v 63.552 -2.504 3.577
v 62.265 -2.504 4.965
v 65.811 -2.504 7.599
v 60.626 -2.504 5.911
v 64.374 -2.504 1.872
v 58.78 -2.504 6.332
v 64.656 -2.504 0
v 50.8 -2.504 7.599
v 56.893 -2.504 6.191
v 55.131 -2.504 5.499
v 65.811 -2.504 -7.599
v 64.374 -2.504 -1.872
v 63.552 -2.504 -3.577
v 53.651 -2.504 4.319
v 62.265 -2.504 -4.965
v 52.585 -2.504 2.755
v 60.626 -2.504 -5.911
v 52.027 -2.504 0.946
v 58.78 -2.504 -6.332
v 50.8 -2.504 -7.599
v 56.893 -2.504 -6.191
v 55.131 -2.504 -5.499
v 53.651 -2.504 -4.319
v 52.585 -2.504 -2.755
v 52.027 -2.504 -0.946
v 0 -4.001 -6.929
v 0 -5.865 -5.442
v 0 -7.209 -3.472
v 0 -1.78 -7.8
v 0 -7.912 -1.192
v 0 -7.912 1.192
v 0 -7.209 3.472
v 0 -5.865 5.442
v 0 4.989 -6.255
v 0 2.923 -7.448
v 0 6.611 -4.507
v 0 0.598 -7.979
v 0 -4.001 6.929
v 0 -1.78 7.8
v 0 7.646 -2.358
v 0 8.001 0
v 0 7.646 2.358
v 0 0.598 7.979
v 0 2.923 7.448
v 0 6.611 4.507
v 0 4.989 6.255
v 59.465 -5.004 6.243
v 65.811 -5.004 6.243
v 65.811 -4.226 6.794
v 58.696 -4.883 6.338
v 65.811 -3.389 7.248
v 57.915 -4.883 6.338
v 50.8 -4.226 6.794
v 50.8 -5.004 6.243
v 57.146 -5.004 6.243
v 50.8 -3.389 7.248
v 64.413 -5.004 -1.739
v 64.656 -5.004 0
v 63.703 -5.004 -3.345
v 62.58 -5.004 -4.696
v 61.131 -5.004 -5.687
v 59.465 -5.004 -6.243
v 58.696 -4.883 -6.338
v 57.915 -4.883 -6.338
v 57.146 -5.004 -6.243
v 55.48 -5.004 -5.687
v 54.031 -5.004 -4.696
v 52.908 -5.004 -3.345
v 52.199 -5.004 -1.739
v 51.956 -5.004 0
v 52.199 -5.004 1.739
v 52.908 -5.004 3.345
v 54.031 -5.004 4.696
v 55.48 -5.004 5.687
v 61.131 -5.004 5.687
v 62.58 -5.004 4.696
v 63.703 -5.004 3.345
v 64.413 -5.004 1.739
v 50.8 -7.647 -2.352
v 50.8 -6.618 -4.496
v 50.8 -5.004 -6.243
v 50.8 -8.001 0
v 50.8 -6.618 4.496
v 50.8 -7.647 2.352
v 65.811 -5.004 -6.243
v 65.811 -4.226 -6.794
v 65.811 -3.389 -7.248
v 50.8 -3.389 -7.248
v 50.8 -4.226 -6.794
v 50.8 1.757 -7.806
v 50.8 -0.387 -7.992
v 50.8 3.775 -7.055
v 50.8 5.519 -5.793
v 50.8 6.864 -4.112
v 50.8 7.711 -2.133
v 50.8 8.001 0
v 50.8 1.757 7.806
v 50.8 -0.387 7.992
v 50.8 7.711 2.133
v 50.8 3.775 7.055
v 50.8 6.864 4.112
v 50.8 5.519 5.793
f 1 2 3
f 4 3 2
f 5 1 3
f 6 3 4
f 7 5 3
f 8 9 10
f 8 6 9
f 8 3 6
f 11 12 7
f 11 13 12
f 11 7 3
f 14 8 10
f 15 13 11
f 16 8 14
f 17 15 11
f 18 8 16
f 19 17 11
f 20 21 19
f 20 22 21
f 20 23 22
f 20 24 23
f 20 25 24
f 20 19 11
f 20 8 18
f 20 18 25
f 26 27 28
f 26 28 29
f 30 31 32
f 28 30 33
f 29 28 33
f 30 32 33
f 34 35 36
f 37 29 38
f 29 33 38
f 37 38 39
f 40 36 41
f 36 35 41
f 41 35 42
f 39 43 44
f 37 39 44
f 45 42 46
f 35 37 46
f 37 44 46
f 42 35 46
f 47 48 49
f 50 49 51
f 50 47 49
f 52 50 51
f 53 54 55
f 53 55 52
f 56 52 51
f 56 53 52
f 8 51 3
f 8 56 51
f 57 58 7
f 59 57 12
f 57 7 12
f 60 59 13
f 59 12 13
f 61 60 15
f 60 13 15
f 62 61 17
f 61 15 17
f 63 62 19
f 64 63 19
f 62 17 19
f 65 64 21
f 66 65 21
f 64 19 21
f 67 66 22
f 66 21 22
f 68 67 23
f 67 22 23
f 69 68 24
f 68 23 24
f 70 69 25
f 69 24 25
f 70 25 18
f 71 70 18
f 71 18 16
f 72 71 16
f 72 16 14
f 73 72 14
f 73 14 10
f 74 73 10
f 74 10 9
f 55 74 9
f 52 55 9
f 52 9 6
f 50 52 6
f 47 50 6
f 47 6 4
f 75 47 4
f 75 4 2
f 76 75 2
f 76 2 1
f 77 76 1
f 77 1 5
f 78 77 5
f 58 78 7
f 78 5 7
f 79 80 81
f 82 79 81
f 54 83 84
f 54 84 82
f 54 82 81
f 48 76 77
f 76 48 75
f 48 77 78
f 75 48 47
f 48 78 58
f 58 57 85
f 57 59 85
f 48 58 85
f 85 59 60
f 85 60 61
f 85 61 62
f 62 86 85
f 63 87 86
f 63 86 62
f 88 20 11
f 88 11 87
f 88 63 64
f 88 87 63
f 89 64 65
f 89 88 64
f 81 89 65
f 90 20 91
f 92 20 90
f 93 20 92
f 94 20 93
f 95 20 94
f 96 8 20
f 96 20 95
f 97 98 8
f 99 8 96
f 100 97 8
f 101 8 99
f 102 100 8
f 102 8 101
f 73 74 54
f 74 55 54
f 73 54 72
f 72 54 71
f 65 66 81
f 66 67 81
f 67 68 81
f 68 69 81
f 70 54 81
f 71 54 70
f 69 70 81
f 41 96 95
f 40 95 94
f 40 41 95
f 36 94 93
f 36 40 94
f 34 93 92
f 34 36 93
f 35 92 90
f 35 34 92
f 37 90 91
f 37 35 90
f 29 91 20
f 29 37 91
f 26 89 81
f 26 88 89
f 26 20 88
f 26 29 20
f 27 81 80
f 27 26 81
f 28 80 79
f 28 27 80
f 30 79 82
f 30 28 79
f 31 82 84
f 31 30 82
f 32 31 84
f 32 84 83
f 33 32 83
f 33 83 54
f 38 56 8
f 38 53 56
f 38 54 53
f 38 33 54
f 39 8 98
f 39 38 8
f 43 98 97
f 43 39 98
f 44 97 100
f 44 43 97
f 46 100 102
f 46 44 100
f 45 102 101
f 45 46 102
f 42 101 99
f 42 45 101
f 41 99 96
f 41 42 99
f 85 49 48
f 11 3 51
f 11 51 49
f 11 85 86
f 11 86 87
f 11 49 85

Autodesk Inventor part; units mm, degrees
ref_plane "YZ Plane" through (0, 0, 0) normal (1, 0, 0) x (0, 1, 0)
ref_plane "XZ Plane" through (0, 0, 0) normal (0, 1, 0) x (-1, 0, 0)
ref_plane "XY Plane" through (0, 0, 0) normal (0, 0, 1) x (1, 0, 0)
sketch "Sketch1" plane through (0, 0, 0) normal (1, 0, 0) x (0, 1, 0)
  circle A0 centre (0, 0) radius 8.001
  dimension "d0" = 16.002
extrude "Extrusion1" add sketch "Sketch1" along normal blind 50.8
sketch "Sketch2" plane through (50.8, 0, 0) normal (1, 0, 0) x (0, 0, -1)
  line L0 (-6.2432, -5.0038) -> (6.2432, -5.0038)
  line L1 (-7.5991, -2.5038) -> (7.5991, -2.5038)
  arc A0 (6.2432, -5.0038) -> (7.5991, -2.5038) centre (0, 0) ccw
  arc A1 (-7.5991, -2.5038) -> (-6.2432, -5.0038) centre (0, 0) ccw
  circle A2 centre (0, 0) radius 8.001 projected
  point P0 (7.0332, -3.8145)
  point P1 (-7.0332, -3.8145)
  dimension "d3" = 5.0038
  dimension "d4" = 2.5
extrude "Extrusion2" add sketch "Sketch2" along normal blind 15.0114 contours A1 L1 A0 L0
sketch "Sketch3" plane through (50.8, -2.5038, 7.5991) normal (0, 1, 0) x (1, 0, 0)
  circle A0 centre (7.5057, 7.5991) radius 6.35
  line L0 (0, 15.1983) -> (15.0114, 15.1983) projected
  line L1 (0, 0) -> (15.0114, 0) projected
  point P0 (-50.8, 7.5991)
  point P1 (7.5057, 15.1983)
  dimension "d8" = 12.7
  dimension "d9" = 7.5991
  dimension "d10" = 15.1983
extrude "Extrusion3" cut sketch "Sketch3" against normal blind 15.0114
equation "\"d9\" = 0.5 * d10"
properties part number "Ring Connector model 3"
